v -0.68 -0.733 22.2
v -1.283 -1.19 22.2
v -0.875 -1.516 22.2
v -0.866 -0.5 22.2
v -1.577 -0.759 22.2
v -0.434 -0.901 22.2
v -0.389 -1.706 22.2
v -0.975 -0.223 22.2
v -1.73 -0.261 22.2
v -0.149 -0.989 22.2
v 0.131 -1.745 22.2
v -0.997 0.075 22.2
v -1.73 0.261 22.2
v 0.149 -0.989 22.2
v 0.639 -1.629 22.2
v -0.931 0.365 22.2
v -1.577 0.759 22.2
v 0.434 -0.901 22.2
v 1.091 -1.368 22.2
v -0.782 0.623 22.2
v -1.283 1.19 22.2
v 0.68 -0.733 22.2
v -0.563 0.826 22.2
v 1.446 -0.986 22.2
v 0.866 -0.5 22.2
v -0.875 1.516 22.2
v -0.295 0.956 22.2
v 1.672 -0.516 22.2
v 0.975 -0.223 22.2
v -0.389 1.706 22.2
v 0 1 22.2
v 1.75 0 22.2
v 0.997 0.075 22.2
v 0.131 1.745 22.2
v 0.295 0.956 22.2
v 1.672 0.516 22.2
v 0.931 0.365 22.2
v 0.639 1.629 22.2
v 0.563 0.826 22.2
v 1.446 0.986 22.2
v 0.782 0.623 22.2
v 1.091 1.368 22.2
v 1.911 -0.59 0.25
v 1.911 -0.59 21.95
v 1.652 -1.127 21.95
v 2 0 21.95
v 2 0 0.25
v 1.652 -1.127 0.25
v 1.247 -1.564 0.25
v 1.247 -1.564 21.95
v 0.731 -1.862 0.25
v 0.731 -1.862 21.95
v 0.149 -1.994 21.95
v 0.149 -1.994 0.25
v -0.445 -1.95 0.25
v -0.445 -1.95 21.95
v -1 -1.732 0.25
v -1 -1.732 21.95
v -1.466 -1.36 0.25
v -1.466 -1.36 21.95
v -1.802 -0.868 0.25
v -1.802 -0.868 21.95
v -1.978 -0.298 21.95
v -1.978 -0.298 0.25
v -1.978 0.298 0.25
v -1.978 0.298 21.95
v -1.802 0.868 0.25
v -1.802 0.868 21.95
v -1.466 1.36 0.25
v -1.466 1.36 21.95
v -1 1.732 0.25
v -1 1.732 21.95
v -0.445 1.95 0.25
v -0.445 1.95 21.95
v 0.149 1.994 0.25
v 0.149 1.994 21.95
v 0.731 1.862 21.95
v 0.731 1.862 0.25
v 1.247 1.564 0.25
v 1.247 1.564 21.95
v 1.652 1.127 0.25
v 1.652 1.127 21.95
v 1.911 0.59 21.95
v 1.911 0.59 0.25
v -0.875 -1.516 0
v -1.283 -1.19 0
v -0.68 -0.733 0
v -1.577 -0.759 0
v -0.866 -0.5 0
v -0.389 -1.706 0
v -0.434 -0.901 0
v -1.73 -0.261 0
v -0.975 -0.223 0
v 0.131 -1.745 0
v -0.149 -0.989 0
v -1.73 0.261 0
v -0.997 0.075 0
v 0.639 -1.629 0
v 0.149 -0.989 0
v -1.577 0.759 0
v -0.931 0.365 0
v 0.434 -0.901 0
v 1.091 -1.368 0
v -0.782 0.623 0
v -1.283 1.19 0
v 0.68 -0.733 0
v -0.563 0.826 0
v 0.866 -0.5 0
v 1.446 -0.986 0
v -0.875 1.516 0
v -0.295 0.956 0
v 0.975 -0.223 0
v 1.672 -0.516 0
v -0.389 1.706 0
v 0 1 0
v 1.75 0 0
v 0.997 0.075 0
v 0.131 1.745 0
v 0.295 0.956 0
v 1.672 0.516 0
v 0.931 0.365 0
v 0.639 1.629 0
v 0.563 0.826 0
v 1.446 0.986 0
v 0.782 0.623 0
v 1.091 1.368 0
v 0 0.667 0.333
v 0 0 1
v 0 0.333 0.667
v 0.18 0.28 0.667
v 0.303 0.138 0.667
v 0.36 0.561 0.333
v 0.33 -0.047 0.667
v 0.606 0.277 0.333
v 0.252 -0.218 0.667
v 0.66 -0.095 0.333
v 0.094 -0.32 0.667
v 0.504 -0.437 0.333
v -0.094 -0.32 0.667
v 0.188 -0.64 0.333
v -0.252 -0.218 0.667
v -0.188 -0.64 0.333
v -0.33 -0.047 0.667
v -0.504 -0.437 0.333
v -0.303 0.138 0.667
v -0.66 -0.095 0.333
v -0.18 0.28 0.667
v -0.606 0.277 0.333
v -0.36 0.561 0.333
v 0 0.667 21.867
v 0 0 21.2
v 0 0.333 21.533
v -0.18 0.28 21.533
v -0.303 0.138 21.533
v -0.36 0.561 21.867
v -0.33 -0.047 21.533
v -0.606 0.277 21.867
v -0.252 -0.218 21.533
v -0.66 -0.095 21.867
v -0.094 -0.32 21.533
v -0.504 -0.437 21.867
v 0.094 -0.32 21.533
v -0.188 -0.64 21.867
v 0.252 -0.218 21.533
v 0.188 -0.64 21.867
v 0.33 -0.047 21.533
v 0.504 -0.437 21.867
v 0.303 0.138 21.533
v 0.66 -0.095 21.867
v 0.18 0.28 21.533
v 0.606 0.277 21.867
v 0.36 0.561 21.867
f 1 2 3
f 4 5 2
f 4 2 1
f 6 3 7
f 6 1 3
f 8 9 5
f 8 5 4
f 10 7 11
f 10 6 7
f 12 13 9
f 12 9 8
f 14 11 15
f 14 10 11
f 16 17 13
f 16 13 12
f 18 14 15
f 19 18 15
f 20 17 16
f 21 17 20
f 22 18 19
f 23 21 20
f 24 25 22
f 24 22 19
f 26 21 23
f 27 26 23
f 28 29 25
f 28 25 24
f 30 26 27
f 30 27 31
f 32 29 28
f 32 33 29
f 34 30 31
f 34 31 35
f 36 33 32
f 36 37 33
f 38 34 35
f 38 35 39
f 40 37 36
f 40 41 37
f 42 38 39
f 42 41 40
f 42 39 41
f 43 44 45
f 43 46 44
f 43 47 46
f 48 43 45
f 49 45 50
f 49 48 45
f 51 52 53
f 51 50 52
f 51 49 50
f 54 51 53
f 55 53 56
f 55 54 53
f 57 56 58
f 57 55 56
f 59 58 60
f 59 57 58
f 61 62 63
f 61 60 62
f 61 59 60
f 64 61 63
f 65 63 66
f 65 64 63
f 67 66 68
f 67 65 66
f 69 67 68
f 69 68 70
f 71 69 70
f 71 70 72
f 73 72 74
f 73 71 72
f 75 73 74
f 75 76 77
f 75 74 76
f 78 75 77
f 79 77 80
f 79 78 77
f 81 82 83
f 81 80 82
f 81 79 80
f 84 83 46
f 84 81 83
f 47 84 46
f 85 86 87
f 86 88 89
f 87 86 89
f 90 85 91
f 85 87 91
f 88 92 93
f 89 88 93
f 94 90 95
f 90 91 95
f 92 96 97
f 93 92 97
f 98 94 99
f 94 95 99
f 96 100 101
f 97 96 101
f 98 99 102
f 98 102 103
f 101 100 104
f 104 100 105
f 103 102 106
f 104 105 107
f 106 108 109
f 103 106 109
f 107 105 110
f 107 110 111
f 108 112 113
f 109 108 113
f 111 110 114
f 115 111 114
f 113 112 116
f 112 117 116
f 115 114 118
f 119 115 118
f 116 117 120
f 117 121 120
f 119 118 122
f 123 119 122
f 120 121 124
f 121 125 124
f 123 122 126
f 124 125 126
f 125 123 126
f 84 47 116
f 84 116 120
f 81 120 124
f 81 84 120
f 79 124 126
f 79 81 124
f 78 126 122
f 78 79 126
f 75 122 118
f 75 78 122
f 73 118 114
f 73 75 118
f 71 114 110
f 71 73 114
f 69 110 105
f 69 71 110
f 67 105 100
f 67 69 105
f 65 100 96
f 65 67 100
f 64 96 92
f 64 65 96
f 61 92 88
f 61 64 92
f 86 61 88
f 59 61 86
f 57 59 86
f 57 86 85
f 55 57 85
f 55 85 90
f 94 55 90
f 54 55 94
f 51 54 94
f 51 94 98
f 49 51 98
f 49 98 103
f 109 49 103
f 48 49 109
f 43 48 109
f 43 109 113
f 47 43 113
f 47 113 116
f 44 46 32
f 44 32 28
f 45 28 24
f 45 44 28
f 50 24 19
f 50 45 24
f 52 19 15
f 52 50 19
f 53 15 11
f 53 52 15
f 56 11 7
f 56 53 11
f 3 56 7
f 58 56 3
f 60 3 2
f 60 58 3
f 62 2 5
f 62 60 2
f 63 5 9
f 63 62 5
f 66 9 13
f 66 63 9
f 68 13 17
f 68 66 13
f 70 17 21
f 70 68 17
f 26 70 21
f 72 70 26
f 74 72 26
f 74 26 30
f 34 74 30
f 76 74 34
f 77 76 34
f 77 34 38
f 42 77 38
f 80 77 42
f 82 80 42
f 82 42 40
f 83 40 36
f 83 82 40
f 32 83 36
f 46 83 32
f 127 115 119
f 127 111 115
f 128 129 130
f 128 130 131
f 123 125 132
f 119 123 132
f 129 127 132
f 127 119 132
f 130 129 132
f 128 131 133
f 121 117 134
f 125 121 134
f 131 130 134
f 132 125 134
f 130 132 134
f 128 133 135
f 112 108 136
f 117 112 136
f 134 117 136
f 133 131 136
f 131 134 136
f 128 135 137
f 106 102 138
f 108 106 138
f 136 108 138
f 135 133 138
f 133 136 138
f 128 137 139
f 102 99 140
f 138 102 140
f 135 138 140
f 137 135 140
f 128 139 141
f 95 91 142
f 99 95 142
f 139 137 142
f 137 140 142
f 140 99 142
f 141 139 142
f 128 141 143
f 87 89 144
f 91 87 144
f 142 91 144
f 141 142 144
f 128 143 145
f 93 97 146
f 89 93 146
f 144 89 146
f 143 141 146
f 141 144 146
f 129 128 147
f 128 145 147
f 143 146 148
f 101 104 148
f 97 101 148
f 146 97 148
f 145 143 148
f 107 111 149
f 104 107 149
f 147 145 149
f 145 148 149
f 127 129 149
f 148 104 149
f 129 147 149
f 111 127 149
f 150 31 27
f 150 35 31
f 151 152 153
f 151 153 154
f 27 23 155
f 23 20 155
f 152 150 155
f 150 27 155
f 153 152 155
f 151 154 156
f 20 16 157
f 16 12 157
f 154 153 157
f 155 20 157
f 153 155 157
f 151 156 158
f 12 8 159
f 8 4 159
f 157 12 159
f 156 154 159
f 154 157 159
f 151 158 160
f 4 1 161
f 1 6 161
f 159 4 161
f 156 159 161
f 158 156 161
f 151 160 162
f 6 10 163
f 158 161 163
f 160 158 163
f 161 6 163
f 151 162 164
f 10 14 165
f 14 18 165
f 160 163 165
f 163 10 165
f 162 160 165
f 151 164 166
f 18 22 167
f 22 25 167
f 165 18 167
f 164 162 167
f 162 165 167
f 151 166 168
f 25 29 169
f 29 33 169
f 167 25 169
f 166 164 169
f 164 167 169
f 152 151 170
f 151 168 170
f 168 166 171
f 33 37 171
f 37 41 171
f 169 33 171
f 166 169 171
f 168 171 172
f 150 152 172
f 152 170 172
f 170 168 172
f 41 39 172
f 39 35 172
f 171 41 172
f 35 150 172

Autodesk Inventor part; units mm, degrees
ref_plane "YZ Plane" through (0, 0, 0) normal (1, 0, 0) x (0, 1, 0)
ref_plane "XZ Plane" through (0, 0, 0) normal (0, 1, 0) x (-1, 0, 0)
ref_plane "XY Plane" through (0, 0, 0) normal (0, 0, 1) x (1, 0, 0)
sketch "Sketch1" plane through (0, 0, 0) normal (0, 0, 1) x (1, 0, 0)
  circle A0 centre (0, 0) radius 2
  dimension "d0" = 4
extrude "Extrusion1" add sketch "Sketch1" along normal blind 22.2
chamfer "Chamfer1" distance 0.25 angle 45 2 edges at (-2, 0, 22.2) (-2, 0, 0)
sketch "Sketch2" plane through (0, 0, 0) normal (1, 0, 0) x (0, 1, 0)
  line L0 (2, 0.25) -> (1.75, 0) projected
  line L1 (1.75, 0) -> (-1.75, 0) projected
  line L2 (-1.75, 0) -> (-2, 0.25) projected
  line L3 (-2, 0.25) -> (-2, 21.95) projected
  line L4 (-2, 21.95) -> (-1.75, 22.2) projected
  line L5 (-1.75, 22.2) -> (1.75, 22.2) projected
  line L6 (1.75, 22.2) -> (2, 21.95) projected
  line L7 (2, 21.95) -> (2, 0.25) projected
  line L8 (-1.75, 22.2) -> (1.75, 22.2) projected
  line L9 (1, 22.2) -> (0, 21.2)
  line L10 (0, 21.2) -> (0, 22.2)
  line L11 (1, 0) -> (0, 1)
  line L12 (0, 1) -> (0, 0)
  line L13 (0, -4.4) -> (0, 26.4) projected
  dimension "d6" = 1
  dimension "d7" = 1
  dimension "d8" = 45
revolve "Revolution1" cut sketch "Sketch2" angle 360 about axis through (0, 0, -10) along (0, 0, 1) contours L1 L12 L11 | L9 L10 L5
equation "\"d7\" = d6"
properties part number "MotorBeltTensionerAxis"
